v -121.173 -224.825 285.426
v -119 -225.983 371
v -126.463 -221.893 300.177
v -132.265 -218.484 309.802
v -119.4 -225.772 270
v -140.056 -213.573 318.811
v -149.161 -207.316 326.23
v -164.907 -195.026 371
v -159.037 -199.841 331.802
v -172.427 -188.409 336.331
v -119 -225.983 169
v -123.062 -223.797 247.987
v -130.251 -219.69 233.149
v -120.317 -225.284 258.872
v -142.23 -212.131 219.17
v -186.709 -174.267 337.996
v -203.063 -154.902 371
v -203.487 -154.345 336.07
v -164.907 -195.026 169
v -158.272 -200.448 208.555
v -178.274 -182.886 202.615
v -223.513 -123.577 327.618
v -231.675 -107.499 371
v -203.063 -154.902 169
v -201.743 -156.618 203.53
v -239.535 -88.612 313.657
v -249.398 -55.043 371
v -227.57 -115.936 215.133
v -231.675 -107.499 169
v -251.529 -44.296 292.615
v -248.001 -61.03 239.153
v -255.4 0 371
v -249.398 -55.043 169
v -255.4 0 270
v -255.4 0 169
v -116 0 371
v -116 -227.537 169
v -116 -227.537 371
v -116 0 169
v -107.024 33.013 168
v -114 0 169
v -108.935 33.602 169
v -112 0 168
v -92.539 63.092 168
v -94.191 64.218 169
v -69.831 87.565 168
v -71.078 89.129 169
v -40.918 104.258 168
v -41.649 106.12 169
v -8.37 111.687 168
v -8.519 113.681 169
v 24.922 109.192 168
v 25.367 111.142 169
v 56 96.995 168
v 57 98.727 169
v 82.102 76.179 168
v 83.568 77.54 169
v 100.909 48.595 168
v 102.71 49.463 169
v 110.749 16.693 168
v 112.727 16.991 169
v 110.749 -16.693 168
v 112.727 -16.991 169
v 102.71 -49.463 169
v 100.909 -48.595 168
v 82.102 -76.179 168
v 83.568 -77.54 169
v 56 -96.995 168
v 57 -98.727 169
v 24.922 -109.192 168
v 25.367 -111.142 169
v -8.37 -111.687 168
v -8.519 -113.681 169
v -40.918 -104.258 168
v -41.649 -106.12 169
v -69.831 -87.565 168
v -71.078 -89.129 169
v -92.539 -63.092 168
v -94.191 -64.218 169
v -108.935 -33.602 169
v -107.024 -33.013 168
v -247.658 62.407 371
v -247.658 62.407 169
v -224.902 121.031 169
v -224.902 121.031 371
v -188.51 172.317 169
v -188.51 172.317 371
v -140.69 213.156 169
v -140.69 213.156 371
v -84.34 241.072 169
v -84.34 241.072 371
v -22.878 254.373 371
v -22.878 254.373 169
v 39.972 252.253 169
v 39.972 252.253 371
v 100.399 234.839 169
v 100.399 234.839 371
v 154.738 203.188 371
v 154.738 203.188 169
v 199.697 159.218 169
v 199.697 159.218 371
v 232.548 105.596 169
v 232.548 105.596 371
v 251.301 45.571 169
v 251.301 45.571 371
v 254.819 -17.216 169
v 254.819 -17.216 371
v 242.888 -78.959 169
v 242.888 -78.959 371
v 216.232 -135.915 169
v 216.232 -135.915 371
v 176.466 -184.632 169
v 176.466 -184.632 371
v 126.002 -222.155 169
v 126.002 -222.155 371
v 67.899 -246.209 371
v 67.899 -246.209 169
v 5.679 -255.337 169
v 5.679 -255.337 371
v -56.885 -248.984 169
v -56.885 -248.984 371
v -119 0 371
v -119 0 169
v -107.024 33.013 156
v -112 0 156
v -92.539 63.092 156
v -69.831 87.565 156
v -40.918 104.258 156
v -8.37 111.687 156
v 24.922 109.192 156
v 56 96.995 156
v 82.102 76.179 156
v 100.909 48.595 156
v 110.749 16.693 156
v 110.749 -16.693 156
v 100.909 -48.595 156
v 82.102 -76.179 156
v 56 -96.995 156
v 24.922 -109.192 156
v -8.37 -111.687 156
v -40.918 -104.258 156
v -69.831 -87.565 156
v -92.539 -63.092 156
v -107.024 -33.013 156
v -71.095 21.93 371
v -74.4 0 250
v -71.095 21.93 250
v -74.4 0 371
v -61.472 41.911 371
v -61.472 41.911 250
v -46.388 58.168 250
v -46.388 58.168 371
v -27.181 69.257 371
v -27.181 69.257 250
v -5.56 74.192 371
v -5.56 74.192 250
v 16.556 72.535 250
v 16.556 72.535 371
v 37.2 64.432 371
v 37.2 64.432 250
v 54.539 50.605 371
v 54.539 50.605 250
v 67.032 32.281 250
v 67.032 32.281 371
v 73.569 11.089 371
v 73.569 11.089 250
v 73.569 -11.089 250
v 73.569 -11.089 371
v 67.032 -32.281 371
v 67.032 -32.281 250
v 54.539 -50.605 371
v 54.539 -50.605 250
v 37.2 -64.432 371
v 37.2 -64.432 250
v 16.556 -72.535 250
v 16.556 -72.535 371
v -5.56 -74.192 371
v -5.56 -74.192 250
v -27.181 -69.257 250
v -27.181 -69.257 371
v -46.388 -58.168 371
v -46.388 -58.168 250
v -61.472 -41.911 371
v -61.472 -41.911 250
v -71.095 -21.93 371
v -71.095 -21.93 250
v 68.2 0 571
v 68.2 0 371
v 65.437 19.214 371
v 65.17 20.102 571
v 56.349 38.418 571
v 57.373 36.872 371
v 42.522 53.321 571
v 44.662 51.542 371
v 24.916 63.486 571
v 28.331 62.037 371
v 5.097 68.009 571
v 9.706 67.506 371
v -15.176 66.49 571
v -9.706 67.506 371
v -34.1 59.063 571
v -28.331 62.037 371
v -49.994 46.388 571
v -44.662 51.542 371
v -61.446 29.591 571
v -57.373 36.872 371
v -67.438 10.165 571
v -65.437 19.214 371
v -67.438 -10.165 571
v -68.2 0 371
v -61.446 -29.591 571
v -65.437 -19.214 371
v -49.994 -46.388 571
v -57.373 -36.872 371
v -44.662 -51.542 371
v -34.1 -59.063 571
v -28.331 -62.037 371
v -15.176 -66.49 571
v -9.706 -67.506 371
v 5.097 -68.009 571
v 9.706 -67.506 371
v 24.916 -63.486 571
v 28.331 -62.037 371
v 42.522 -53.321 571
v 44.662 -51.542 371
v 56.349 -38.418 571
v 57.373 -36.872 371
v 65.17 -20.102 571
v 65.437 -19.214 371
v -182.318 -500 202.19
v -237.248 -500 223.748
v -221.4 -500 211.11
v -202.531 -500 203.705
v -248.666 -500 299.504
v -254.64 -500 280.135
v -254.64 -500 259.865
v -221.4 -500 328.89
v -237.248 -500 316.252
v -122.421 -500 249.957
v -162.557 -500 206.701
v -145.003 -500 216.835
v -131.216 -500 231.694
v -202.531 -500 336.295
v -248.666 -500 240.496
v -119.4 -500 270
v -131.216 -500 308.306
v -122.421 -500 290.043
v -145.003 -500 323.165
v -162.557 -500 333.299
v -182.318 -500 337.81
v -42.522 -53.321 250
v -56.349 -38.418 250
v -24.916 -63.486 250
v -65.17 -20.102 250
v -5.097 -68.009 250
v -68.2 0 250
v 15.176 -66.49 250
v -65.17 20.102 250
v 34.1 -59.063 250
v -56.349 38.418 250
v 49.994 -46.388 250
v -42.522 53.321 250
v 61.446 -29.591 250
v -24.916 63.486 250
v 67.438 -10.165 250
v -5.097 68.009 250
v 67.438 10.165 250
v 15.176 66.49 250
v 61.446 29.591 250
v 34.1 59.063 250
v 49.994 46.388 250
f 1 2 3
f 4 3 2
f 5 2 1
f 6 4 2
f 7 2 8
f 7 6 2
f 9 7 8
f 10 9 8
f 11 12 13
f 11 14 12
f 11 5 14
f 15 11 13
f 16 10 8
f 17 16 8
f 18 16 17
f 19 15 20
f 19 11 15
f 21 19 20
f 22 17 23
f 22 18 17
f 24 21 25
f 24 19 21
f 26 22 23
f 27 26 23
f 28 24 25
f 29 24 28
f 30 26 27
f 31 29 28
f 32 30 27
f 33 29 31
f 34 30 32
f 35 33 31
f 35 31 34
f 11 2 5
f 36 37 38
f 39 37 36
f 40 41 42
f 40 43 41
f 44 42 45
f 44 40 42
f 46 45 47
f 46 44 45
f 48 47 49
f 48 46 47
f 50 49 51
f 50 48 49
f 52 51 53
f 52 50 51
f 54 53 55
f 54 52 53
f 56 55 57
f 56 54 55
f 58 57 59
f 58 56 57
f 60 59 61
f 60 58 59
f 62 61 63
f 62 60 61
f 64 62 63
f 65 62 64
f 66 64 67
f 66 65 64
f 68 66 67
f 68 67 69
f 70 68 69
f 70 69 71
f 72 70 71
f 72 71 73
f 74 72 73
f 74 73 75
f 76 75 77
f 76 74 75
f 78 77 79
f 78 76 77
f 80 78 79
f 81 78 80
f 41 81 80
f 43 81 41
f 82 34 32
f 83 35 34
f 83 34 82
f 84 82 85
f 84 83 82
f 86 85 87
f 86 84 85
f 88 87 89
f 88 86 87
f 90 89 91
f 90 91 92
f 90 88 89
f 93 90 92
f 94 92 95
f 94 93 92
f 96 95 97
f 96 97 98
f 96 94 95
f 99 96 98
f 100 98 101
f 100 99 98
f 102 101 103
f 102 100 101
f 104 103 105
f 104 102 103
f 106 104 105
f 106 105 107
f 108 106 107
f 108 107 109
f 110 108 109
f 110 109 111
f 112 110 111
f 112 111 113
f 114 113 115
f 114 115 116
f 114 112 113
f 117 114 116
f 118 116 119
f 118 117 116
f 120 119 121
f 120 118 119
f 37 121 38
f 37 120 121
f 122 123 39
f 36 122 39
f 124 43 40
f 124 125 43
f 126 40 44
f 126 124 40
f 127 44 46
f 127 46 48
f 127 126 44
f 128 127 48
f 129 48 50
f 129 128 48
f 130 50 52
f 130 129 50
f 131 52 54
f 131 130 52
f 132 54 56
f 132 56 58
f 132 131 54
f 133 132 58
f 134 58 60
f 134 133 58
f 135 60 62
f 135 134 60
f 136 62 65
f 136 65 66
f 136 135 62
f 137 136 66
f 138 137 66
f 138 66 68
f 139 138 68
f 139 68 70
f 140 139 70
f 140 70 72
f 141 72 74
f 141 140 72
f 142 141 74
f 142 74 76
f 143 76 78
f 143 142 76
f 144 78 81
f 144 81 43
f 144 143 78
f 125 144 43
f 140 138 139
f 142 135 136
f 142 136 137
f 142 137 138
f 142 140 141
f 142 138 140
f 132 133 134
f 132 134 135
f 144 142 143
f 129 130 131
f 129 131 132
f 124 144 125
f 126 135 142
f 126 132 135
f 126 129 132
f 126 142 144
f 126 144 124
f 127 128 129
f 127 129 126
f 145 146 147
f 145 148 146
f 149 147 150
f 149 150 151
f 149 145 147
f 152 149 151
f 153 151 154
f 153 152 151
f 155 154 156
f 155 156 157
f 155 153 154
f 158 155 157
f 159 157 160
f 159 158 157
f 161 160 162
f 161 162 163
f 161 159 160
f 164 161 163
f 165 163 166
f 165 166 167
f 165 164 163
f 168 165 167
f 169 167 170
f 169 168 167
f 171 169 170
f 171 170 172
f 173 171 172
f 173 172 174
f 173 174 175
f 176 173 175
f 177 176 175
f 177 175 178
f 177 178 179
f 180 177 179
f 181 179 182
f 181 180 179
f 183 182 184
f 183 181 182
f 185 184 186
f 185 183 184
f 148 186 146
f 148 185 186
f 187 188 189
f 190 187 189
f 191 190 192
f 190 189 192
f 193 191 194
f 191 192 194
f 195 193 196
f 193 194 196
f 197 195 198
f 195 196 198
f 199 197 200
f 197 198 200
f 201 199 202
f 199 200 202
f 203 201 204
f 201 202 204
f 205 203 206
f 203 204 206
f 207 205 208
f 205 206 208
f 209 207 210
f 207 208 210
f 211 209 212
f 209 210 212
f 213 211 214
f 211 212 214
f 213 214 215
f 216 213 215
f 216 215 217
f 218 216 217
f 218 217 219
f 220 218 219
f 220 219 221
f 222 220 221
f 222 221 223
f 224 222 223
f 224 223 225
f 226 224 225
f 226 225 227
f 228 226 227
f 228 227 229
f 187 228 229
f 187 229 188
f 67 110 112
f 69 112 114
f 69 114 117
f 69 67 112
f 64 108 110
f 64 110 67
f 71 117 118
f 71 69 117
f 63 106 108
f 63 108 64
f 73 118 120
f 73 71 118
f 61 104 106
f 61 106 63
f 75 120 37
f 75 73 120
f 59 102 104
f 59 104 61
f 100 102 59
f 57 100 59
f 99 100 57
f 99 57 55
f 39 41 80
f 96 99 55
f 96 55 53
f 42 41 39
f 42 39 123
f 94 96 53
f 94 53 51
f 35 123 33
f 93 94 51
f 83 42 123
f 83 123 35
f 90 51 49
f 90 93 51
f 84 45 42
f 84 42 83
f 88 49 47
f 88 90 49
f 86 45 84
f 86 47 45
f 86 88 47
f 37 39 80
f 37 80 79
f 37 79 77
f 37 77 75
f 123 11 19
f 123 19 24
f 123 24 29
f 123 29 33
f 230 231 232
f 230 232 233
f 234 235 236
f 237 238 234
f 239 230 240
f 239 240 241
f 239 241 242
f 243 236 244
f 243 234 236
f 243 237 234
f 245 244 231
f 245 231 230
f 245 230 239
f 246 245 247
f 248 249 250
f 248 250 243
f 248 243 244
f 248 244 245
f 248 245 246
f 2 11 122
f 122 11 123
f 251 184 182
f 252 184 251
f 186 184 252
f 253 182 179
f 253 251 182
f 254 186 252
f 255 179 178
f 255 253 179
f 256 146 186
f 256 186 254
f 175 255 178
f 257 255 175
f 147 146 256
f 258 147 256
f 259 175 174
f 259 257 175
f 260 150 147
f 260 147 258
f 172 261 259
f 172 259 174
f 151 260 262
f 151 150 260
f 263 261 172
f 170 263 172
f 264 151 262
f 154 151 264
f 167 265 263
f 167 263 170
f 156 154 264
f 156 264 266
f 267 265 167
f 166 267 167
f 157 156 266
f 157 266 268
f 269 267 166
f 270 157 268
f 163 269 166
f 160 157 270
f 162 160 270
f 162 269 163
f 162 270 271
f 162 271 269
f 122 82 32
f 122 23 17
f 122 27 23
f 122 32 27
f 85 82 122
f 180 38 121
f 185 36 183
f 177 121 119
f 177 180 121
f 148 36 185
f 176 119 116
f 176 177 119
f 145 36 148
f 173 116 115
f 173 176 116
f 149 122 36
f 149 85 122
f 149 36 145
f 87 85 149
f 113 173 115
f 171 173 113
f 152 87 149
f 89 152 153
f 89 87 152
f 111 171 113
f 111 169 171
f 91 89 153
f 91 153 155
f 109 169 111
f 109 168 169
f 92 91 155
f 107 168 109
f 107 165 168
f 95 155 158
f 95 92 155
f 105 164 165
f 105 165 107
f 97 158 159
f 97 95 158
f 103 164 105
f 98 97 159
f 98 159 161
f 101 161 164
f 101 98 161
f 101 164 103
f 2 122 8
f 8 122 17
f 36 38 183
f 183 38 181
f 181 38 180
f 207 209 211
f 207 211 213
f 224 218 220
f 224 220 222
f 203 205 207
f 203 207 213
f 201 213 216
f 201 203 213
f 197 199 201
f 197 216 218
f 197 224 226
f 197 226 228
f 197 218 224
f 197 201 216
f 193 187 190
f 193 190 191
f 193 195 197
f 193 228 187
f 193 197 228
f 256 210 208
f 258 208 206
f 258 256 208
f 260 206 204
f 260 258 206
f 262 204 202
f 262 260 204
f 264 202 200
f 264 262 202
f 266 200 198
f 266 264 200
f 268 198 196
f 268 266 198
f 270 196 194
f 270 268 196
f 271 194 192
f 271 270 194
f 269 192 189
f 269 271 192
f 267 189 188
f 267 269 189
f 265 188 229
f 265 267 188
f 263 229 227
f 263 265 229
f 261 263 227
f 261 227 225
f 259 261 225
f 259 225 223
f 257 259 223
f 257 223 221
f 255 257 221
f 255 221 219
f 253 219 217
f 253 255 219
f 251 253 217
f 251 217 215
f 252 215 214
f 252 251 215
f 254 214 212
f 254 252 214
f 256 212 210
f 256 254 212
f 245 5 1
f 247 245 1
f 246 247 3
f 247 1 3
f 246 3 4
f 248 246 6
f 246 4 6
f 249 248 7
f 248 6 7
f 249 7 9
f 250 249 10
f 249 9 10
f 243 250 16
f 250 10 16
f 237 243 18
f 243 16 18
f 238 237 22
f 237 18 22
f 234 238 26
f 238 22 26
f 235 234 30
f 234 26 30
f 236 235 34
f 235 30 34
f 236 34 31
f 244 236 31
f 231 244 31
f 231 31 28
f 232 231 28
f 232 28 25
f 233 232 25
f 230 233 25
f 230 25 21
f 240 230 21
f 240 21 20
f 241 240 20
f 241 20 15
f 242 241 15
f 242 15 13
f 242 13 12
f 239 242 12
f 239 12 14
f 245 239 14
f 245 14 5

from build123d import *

# Parameters (mm, degrees)
F2_R      = 68
F3_DEPTH  = 500
F1_FACE_R = 68.2
F4_DEPTH  = 200
F5_W      = 3
F5_H      = 250
F6_DEPTH  = 375


with BuildPart() as f1:
    # F0 (on Front) → F1 (revolve)
    with BuildSketch(Plane.XZ):
        Polygon((-255.4, 169), (-114, 169), (-112, 168), (-112, 156), (0, 156), (0, 371), (-68.2, 371), (-68.2, 250), (-74.4, 250), (-74.4, 371), (-255.4, 371), align=None)
    revolve(axis=Axis((0, 0, 263.5), (0, 0, -1)))

    # F2 (on Front) → F3 (join)
    with BuildSketch(Plane.XZ):
        with Locations((-187.4, 270)):
            Circle(F2_R)
    extrude(amount=F3_DEPTH)

    # F1_face (on face) → F4 (join)
    with BuildSketch(Plane.XY.offset(371)):
        Circle(F1_FACE_R)
    extrude(amount=F4_DEPTH)

    # F5 (on Top) → F6 (cut)
    with BuildSketch(Plane.XY):
        with Locations((-117.5, -125)):
            Rectangle(F5_W, F5_H)
    extrude(amount=F6_DEPTH, mode=Mode.SUBTRACT)


solid = f1.part
